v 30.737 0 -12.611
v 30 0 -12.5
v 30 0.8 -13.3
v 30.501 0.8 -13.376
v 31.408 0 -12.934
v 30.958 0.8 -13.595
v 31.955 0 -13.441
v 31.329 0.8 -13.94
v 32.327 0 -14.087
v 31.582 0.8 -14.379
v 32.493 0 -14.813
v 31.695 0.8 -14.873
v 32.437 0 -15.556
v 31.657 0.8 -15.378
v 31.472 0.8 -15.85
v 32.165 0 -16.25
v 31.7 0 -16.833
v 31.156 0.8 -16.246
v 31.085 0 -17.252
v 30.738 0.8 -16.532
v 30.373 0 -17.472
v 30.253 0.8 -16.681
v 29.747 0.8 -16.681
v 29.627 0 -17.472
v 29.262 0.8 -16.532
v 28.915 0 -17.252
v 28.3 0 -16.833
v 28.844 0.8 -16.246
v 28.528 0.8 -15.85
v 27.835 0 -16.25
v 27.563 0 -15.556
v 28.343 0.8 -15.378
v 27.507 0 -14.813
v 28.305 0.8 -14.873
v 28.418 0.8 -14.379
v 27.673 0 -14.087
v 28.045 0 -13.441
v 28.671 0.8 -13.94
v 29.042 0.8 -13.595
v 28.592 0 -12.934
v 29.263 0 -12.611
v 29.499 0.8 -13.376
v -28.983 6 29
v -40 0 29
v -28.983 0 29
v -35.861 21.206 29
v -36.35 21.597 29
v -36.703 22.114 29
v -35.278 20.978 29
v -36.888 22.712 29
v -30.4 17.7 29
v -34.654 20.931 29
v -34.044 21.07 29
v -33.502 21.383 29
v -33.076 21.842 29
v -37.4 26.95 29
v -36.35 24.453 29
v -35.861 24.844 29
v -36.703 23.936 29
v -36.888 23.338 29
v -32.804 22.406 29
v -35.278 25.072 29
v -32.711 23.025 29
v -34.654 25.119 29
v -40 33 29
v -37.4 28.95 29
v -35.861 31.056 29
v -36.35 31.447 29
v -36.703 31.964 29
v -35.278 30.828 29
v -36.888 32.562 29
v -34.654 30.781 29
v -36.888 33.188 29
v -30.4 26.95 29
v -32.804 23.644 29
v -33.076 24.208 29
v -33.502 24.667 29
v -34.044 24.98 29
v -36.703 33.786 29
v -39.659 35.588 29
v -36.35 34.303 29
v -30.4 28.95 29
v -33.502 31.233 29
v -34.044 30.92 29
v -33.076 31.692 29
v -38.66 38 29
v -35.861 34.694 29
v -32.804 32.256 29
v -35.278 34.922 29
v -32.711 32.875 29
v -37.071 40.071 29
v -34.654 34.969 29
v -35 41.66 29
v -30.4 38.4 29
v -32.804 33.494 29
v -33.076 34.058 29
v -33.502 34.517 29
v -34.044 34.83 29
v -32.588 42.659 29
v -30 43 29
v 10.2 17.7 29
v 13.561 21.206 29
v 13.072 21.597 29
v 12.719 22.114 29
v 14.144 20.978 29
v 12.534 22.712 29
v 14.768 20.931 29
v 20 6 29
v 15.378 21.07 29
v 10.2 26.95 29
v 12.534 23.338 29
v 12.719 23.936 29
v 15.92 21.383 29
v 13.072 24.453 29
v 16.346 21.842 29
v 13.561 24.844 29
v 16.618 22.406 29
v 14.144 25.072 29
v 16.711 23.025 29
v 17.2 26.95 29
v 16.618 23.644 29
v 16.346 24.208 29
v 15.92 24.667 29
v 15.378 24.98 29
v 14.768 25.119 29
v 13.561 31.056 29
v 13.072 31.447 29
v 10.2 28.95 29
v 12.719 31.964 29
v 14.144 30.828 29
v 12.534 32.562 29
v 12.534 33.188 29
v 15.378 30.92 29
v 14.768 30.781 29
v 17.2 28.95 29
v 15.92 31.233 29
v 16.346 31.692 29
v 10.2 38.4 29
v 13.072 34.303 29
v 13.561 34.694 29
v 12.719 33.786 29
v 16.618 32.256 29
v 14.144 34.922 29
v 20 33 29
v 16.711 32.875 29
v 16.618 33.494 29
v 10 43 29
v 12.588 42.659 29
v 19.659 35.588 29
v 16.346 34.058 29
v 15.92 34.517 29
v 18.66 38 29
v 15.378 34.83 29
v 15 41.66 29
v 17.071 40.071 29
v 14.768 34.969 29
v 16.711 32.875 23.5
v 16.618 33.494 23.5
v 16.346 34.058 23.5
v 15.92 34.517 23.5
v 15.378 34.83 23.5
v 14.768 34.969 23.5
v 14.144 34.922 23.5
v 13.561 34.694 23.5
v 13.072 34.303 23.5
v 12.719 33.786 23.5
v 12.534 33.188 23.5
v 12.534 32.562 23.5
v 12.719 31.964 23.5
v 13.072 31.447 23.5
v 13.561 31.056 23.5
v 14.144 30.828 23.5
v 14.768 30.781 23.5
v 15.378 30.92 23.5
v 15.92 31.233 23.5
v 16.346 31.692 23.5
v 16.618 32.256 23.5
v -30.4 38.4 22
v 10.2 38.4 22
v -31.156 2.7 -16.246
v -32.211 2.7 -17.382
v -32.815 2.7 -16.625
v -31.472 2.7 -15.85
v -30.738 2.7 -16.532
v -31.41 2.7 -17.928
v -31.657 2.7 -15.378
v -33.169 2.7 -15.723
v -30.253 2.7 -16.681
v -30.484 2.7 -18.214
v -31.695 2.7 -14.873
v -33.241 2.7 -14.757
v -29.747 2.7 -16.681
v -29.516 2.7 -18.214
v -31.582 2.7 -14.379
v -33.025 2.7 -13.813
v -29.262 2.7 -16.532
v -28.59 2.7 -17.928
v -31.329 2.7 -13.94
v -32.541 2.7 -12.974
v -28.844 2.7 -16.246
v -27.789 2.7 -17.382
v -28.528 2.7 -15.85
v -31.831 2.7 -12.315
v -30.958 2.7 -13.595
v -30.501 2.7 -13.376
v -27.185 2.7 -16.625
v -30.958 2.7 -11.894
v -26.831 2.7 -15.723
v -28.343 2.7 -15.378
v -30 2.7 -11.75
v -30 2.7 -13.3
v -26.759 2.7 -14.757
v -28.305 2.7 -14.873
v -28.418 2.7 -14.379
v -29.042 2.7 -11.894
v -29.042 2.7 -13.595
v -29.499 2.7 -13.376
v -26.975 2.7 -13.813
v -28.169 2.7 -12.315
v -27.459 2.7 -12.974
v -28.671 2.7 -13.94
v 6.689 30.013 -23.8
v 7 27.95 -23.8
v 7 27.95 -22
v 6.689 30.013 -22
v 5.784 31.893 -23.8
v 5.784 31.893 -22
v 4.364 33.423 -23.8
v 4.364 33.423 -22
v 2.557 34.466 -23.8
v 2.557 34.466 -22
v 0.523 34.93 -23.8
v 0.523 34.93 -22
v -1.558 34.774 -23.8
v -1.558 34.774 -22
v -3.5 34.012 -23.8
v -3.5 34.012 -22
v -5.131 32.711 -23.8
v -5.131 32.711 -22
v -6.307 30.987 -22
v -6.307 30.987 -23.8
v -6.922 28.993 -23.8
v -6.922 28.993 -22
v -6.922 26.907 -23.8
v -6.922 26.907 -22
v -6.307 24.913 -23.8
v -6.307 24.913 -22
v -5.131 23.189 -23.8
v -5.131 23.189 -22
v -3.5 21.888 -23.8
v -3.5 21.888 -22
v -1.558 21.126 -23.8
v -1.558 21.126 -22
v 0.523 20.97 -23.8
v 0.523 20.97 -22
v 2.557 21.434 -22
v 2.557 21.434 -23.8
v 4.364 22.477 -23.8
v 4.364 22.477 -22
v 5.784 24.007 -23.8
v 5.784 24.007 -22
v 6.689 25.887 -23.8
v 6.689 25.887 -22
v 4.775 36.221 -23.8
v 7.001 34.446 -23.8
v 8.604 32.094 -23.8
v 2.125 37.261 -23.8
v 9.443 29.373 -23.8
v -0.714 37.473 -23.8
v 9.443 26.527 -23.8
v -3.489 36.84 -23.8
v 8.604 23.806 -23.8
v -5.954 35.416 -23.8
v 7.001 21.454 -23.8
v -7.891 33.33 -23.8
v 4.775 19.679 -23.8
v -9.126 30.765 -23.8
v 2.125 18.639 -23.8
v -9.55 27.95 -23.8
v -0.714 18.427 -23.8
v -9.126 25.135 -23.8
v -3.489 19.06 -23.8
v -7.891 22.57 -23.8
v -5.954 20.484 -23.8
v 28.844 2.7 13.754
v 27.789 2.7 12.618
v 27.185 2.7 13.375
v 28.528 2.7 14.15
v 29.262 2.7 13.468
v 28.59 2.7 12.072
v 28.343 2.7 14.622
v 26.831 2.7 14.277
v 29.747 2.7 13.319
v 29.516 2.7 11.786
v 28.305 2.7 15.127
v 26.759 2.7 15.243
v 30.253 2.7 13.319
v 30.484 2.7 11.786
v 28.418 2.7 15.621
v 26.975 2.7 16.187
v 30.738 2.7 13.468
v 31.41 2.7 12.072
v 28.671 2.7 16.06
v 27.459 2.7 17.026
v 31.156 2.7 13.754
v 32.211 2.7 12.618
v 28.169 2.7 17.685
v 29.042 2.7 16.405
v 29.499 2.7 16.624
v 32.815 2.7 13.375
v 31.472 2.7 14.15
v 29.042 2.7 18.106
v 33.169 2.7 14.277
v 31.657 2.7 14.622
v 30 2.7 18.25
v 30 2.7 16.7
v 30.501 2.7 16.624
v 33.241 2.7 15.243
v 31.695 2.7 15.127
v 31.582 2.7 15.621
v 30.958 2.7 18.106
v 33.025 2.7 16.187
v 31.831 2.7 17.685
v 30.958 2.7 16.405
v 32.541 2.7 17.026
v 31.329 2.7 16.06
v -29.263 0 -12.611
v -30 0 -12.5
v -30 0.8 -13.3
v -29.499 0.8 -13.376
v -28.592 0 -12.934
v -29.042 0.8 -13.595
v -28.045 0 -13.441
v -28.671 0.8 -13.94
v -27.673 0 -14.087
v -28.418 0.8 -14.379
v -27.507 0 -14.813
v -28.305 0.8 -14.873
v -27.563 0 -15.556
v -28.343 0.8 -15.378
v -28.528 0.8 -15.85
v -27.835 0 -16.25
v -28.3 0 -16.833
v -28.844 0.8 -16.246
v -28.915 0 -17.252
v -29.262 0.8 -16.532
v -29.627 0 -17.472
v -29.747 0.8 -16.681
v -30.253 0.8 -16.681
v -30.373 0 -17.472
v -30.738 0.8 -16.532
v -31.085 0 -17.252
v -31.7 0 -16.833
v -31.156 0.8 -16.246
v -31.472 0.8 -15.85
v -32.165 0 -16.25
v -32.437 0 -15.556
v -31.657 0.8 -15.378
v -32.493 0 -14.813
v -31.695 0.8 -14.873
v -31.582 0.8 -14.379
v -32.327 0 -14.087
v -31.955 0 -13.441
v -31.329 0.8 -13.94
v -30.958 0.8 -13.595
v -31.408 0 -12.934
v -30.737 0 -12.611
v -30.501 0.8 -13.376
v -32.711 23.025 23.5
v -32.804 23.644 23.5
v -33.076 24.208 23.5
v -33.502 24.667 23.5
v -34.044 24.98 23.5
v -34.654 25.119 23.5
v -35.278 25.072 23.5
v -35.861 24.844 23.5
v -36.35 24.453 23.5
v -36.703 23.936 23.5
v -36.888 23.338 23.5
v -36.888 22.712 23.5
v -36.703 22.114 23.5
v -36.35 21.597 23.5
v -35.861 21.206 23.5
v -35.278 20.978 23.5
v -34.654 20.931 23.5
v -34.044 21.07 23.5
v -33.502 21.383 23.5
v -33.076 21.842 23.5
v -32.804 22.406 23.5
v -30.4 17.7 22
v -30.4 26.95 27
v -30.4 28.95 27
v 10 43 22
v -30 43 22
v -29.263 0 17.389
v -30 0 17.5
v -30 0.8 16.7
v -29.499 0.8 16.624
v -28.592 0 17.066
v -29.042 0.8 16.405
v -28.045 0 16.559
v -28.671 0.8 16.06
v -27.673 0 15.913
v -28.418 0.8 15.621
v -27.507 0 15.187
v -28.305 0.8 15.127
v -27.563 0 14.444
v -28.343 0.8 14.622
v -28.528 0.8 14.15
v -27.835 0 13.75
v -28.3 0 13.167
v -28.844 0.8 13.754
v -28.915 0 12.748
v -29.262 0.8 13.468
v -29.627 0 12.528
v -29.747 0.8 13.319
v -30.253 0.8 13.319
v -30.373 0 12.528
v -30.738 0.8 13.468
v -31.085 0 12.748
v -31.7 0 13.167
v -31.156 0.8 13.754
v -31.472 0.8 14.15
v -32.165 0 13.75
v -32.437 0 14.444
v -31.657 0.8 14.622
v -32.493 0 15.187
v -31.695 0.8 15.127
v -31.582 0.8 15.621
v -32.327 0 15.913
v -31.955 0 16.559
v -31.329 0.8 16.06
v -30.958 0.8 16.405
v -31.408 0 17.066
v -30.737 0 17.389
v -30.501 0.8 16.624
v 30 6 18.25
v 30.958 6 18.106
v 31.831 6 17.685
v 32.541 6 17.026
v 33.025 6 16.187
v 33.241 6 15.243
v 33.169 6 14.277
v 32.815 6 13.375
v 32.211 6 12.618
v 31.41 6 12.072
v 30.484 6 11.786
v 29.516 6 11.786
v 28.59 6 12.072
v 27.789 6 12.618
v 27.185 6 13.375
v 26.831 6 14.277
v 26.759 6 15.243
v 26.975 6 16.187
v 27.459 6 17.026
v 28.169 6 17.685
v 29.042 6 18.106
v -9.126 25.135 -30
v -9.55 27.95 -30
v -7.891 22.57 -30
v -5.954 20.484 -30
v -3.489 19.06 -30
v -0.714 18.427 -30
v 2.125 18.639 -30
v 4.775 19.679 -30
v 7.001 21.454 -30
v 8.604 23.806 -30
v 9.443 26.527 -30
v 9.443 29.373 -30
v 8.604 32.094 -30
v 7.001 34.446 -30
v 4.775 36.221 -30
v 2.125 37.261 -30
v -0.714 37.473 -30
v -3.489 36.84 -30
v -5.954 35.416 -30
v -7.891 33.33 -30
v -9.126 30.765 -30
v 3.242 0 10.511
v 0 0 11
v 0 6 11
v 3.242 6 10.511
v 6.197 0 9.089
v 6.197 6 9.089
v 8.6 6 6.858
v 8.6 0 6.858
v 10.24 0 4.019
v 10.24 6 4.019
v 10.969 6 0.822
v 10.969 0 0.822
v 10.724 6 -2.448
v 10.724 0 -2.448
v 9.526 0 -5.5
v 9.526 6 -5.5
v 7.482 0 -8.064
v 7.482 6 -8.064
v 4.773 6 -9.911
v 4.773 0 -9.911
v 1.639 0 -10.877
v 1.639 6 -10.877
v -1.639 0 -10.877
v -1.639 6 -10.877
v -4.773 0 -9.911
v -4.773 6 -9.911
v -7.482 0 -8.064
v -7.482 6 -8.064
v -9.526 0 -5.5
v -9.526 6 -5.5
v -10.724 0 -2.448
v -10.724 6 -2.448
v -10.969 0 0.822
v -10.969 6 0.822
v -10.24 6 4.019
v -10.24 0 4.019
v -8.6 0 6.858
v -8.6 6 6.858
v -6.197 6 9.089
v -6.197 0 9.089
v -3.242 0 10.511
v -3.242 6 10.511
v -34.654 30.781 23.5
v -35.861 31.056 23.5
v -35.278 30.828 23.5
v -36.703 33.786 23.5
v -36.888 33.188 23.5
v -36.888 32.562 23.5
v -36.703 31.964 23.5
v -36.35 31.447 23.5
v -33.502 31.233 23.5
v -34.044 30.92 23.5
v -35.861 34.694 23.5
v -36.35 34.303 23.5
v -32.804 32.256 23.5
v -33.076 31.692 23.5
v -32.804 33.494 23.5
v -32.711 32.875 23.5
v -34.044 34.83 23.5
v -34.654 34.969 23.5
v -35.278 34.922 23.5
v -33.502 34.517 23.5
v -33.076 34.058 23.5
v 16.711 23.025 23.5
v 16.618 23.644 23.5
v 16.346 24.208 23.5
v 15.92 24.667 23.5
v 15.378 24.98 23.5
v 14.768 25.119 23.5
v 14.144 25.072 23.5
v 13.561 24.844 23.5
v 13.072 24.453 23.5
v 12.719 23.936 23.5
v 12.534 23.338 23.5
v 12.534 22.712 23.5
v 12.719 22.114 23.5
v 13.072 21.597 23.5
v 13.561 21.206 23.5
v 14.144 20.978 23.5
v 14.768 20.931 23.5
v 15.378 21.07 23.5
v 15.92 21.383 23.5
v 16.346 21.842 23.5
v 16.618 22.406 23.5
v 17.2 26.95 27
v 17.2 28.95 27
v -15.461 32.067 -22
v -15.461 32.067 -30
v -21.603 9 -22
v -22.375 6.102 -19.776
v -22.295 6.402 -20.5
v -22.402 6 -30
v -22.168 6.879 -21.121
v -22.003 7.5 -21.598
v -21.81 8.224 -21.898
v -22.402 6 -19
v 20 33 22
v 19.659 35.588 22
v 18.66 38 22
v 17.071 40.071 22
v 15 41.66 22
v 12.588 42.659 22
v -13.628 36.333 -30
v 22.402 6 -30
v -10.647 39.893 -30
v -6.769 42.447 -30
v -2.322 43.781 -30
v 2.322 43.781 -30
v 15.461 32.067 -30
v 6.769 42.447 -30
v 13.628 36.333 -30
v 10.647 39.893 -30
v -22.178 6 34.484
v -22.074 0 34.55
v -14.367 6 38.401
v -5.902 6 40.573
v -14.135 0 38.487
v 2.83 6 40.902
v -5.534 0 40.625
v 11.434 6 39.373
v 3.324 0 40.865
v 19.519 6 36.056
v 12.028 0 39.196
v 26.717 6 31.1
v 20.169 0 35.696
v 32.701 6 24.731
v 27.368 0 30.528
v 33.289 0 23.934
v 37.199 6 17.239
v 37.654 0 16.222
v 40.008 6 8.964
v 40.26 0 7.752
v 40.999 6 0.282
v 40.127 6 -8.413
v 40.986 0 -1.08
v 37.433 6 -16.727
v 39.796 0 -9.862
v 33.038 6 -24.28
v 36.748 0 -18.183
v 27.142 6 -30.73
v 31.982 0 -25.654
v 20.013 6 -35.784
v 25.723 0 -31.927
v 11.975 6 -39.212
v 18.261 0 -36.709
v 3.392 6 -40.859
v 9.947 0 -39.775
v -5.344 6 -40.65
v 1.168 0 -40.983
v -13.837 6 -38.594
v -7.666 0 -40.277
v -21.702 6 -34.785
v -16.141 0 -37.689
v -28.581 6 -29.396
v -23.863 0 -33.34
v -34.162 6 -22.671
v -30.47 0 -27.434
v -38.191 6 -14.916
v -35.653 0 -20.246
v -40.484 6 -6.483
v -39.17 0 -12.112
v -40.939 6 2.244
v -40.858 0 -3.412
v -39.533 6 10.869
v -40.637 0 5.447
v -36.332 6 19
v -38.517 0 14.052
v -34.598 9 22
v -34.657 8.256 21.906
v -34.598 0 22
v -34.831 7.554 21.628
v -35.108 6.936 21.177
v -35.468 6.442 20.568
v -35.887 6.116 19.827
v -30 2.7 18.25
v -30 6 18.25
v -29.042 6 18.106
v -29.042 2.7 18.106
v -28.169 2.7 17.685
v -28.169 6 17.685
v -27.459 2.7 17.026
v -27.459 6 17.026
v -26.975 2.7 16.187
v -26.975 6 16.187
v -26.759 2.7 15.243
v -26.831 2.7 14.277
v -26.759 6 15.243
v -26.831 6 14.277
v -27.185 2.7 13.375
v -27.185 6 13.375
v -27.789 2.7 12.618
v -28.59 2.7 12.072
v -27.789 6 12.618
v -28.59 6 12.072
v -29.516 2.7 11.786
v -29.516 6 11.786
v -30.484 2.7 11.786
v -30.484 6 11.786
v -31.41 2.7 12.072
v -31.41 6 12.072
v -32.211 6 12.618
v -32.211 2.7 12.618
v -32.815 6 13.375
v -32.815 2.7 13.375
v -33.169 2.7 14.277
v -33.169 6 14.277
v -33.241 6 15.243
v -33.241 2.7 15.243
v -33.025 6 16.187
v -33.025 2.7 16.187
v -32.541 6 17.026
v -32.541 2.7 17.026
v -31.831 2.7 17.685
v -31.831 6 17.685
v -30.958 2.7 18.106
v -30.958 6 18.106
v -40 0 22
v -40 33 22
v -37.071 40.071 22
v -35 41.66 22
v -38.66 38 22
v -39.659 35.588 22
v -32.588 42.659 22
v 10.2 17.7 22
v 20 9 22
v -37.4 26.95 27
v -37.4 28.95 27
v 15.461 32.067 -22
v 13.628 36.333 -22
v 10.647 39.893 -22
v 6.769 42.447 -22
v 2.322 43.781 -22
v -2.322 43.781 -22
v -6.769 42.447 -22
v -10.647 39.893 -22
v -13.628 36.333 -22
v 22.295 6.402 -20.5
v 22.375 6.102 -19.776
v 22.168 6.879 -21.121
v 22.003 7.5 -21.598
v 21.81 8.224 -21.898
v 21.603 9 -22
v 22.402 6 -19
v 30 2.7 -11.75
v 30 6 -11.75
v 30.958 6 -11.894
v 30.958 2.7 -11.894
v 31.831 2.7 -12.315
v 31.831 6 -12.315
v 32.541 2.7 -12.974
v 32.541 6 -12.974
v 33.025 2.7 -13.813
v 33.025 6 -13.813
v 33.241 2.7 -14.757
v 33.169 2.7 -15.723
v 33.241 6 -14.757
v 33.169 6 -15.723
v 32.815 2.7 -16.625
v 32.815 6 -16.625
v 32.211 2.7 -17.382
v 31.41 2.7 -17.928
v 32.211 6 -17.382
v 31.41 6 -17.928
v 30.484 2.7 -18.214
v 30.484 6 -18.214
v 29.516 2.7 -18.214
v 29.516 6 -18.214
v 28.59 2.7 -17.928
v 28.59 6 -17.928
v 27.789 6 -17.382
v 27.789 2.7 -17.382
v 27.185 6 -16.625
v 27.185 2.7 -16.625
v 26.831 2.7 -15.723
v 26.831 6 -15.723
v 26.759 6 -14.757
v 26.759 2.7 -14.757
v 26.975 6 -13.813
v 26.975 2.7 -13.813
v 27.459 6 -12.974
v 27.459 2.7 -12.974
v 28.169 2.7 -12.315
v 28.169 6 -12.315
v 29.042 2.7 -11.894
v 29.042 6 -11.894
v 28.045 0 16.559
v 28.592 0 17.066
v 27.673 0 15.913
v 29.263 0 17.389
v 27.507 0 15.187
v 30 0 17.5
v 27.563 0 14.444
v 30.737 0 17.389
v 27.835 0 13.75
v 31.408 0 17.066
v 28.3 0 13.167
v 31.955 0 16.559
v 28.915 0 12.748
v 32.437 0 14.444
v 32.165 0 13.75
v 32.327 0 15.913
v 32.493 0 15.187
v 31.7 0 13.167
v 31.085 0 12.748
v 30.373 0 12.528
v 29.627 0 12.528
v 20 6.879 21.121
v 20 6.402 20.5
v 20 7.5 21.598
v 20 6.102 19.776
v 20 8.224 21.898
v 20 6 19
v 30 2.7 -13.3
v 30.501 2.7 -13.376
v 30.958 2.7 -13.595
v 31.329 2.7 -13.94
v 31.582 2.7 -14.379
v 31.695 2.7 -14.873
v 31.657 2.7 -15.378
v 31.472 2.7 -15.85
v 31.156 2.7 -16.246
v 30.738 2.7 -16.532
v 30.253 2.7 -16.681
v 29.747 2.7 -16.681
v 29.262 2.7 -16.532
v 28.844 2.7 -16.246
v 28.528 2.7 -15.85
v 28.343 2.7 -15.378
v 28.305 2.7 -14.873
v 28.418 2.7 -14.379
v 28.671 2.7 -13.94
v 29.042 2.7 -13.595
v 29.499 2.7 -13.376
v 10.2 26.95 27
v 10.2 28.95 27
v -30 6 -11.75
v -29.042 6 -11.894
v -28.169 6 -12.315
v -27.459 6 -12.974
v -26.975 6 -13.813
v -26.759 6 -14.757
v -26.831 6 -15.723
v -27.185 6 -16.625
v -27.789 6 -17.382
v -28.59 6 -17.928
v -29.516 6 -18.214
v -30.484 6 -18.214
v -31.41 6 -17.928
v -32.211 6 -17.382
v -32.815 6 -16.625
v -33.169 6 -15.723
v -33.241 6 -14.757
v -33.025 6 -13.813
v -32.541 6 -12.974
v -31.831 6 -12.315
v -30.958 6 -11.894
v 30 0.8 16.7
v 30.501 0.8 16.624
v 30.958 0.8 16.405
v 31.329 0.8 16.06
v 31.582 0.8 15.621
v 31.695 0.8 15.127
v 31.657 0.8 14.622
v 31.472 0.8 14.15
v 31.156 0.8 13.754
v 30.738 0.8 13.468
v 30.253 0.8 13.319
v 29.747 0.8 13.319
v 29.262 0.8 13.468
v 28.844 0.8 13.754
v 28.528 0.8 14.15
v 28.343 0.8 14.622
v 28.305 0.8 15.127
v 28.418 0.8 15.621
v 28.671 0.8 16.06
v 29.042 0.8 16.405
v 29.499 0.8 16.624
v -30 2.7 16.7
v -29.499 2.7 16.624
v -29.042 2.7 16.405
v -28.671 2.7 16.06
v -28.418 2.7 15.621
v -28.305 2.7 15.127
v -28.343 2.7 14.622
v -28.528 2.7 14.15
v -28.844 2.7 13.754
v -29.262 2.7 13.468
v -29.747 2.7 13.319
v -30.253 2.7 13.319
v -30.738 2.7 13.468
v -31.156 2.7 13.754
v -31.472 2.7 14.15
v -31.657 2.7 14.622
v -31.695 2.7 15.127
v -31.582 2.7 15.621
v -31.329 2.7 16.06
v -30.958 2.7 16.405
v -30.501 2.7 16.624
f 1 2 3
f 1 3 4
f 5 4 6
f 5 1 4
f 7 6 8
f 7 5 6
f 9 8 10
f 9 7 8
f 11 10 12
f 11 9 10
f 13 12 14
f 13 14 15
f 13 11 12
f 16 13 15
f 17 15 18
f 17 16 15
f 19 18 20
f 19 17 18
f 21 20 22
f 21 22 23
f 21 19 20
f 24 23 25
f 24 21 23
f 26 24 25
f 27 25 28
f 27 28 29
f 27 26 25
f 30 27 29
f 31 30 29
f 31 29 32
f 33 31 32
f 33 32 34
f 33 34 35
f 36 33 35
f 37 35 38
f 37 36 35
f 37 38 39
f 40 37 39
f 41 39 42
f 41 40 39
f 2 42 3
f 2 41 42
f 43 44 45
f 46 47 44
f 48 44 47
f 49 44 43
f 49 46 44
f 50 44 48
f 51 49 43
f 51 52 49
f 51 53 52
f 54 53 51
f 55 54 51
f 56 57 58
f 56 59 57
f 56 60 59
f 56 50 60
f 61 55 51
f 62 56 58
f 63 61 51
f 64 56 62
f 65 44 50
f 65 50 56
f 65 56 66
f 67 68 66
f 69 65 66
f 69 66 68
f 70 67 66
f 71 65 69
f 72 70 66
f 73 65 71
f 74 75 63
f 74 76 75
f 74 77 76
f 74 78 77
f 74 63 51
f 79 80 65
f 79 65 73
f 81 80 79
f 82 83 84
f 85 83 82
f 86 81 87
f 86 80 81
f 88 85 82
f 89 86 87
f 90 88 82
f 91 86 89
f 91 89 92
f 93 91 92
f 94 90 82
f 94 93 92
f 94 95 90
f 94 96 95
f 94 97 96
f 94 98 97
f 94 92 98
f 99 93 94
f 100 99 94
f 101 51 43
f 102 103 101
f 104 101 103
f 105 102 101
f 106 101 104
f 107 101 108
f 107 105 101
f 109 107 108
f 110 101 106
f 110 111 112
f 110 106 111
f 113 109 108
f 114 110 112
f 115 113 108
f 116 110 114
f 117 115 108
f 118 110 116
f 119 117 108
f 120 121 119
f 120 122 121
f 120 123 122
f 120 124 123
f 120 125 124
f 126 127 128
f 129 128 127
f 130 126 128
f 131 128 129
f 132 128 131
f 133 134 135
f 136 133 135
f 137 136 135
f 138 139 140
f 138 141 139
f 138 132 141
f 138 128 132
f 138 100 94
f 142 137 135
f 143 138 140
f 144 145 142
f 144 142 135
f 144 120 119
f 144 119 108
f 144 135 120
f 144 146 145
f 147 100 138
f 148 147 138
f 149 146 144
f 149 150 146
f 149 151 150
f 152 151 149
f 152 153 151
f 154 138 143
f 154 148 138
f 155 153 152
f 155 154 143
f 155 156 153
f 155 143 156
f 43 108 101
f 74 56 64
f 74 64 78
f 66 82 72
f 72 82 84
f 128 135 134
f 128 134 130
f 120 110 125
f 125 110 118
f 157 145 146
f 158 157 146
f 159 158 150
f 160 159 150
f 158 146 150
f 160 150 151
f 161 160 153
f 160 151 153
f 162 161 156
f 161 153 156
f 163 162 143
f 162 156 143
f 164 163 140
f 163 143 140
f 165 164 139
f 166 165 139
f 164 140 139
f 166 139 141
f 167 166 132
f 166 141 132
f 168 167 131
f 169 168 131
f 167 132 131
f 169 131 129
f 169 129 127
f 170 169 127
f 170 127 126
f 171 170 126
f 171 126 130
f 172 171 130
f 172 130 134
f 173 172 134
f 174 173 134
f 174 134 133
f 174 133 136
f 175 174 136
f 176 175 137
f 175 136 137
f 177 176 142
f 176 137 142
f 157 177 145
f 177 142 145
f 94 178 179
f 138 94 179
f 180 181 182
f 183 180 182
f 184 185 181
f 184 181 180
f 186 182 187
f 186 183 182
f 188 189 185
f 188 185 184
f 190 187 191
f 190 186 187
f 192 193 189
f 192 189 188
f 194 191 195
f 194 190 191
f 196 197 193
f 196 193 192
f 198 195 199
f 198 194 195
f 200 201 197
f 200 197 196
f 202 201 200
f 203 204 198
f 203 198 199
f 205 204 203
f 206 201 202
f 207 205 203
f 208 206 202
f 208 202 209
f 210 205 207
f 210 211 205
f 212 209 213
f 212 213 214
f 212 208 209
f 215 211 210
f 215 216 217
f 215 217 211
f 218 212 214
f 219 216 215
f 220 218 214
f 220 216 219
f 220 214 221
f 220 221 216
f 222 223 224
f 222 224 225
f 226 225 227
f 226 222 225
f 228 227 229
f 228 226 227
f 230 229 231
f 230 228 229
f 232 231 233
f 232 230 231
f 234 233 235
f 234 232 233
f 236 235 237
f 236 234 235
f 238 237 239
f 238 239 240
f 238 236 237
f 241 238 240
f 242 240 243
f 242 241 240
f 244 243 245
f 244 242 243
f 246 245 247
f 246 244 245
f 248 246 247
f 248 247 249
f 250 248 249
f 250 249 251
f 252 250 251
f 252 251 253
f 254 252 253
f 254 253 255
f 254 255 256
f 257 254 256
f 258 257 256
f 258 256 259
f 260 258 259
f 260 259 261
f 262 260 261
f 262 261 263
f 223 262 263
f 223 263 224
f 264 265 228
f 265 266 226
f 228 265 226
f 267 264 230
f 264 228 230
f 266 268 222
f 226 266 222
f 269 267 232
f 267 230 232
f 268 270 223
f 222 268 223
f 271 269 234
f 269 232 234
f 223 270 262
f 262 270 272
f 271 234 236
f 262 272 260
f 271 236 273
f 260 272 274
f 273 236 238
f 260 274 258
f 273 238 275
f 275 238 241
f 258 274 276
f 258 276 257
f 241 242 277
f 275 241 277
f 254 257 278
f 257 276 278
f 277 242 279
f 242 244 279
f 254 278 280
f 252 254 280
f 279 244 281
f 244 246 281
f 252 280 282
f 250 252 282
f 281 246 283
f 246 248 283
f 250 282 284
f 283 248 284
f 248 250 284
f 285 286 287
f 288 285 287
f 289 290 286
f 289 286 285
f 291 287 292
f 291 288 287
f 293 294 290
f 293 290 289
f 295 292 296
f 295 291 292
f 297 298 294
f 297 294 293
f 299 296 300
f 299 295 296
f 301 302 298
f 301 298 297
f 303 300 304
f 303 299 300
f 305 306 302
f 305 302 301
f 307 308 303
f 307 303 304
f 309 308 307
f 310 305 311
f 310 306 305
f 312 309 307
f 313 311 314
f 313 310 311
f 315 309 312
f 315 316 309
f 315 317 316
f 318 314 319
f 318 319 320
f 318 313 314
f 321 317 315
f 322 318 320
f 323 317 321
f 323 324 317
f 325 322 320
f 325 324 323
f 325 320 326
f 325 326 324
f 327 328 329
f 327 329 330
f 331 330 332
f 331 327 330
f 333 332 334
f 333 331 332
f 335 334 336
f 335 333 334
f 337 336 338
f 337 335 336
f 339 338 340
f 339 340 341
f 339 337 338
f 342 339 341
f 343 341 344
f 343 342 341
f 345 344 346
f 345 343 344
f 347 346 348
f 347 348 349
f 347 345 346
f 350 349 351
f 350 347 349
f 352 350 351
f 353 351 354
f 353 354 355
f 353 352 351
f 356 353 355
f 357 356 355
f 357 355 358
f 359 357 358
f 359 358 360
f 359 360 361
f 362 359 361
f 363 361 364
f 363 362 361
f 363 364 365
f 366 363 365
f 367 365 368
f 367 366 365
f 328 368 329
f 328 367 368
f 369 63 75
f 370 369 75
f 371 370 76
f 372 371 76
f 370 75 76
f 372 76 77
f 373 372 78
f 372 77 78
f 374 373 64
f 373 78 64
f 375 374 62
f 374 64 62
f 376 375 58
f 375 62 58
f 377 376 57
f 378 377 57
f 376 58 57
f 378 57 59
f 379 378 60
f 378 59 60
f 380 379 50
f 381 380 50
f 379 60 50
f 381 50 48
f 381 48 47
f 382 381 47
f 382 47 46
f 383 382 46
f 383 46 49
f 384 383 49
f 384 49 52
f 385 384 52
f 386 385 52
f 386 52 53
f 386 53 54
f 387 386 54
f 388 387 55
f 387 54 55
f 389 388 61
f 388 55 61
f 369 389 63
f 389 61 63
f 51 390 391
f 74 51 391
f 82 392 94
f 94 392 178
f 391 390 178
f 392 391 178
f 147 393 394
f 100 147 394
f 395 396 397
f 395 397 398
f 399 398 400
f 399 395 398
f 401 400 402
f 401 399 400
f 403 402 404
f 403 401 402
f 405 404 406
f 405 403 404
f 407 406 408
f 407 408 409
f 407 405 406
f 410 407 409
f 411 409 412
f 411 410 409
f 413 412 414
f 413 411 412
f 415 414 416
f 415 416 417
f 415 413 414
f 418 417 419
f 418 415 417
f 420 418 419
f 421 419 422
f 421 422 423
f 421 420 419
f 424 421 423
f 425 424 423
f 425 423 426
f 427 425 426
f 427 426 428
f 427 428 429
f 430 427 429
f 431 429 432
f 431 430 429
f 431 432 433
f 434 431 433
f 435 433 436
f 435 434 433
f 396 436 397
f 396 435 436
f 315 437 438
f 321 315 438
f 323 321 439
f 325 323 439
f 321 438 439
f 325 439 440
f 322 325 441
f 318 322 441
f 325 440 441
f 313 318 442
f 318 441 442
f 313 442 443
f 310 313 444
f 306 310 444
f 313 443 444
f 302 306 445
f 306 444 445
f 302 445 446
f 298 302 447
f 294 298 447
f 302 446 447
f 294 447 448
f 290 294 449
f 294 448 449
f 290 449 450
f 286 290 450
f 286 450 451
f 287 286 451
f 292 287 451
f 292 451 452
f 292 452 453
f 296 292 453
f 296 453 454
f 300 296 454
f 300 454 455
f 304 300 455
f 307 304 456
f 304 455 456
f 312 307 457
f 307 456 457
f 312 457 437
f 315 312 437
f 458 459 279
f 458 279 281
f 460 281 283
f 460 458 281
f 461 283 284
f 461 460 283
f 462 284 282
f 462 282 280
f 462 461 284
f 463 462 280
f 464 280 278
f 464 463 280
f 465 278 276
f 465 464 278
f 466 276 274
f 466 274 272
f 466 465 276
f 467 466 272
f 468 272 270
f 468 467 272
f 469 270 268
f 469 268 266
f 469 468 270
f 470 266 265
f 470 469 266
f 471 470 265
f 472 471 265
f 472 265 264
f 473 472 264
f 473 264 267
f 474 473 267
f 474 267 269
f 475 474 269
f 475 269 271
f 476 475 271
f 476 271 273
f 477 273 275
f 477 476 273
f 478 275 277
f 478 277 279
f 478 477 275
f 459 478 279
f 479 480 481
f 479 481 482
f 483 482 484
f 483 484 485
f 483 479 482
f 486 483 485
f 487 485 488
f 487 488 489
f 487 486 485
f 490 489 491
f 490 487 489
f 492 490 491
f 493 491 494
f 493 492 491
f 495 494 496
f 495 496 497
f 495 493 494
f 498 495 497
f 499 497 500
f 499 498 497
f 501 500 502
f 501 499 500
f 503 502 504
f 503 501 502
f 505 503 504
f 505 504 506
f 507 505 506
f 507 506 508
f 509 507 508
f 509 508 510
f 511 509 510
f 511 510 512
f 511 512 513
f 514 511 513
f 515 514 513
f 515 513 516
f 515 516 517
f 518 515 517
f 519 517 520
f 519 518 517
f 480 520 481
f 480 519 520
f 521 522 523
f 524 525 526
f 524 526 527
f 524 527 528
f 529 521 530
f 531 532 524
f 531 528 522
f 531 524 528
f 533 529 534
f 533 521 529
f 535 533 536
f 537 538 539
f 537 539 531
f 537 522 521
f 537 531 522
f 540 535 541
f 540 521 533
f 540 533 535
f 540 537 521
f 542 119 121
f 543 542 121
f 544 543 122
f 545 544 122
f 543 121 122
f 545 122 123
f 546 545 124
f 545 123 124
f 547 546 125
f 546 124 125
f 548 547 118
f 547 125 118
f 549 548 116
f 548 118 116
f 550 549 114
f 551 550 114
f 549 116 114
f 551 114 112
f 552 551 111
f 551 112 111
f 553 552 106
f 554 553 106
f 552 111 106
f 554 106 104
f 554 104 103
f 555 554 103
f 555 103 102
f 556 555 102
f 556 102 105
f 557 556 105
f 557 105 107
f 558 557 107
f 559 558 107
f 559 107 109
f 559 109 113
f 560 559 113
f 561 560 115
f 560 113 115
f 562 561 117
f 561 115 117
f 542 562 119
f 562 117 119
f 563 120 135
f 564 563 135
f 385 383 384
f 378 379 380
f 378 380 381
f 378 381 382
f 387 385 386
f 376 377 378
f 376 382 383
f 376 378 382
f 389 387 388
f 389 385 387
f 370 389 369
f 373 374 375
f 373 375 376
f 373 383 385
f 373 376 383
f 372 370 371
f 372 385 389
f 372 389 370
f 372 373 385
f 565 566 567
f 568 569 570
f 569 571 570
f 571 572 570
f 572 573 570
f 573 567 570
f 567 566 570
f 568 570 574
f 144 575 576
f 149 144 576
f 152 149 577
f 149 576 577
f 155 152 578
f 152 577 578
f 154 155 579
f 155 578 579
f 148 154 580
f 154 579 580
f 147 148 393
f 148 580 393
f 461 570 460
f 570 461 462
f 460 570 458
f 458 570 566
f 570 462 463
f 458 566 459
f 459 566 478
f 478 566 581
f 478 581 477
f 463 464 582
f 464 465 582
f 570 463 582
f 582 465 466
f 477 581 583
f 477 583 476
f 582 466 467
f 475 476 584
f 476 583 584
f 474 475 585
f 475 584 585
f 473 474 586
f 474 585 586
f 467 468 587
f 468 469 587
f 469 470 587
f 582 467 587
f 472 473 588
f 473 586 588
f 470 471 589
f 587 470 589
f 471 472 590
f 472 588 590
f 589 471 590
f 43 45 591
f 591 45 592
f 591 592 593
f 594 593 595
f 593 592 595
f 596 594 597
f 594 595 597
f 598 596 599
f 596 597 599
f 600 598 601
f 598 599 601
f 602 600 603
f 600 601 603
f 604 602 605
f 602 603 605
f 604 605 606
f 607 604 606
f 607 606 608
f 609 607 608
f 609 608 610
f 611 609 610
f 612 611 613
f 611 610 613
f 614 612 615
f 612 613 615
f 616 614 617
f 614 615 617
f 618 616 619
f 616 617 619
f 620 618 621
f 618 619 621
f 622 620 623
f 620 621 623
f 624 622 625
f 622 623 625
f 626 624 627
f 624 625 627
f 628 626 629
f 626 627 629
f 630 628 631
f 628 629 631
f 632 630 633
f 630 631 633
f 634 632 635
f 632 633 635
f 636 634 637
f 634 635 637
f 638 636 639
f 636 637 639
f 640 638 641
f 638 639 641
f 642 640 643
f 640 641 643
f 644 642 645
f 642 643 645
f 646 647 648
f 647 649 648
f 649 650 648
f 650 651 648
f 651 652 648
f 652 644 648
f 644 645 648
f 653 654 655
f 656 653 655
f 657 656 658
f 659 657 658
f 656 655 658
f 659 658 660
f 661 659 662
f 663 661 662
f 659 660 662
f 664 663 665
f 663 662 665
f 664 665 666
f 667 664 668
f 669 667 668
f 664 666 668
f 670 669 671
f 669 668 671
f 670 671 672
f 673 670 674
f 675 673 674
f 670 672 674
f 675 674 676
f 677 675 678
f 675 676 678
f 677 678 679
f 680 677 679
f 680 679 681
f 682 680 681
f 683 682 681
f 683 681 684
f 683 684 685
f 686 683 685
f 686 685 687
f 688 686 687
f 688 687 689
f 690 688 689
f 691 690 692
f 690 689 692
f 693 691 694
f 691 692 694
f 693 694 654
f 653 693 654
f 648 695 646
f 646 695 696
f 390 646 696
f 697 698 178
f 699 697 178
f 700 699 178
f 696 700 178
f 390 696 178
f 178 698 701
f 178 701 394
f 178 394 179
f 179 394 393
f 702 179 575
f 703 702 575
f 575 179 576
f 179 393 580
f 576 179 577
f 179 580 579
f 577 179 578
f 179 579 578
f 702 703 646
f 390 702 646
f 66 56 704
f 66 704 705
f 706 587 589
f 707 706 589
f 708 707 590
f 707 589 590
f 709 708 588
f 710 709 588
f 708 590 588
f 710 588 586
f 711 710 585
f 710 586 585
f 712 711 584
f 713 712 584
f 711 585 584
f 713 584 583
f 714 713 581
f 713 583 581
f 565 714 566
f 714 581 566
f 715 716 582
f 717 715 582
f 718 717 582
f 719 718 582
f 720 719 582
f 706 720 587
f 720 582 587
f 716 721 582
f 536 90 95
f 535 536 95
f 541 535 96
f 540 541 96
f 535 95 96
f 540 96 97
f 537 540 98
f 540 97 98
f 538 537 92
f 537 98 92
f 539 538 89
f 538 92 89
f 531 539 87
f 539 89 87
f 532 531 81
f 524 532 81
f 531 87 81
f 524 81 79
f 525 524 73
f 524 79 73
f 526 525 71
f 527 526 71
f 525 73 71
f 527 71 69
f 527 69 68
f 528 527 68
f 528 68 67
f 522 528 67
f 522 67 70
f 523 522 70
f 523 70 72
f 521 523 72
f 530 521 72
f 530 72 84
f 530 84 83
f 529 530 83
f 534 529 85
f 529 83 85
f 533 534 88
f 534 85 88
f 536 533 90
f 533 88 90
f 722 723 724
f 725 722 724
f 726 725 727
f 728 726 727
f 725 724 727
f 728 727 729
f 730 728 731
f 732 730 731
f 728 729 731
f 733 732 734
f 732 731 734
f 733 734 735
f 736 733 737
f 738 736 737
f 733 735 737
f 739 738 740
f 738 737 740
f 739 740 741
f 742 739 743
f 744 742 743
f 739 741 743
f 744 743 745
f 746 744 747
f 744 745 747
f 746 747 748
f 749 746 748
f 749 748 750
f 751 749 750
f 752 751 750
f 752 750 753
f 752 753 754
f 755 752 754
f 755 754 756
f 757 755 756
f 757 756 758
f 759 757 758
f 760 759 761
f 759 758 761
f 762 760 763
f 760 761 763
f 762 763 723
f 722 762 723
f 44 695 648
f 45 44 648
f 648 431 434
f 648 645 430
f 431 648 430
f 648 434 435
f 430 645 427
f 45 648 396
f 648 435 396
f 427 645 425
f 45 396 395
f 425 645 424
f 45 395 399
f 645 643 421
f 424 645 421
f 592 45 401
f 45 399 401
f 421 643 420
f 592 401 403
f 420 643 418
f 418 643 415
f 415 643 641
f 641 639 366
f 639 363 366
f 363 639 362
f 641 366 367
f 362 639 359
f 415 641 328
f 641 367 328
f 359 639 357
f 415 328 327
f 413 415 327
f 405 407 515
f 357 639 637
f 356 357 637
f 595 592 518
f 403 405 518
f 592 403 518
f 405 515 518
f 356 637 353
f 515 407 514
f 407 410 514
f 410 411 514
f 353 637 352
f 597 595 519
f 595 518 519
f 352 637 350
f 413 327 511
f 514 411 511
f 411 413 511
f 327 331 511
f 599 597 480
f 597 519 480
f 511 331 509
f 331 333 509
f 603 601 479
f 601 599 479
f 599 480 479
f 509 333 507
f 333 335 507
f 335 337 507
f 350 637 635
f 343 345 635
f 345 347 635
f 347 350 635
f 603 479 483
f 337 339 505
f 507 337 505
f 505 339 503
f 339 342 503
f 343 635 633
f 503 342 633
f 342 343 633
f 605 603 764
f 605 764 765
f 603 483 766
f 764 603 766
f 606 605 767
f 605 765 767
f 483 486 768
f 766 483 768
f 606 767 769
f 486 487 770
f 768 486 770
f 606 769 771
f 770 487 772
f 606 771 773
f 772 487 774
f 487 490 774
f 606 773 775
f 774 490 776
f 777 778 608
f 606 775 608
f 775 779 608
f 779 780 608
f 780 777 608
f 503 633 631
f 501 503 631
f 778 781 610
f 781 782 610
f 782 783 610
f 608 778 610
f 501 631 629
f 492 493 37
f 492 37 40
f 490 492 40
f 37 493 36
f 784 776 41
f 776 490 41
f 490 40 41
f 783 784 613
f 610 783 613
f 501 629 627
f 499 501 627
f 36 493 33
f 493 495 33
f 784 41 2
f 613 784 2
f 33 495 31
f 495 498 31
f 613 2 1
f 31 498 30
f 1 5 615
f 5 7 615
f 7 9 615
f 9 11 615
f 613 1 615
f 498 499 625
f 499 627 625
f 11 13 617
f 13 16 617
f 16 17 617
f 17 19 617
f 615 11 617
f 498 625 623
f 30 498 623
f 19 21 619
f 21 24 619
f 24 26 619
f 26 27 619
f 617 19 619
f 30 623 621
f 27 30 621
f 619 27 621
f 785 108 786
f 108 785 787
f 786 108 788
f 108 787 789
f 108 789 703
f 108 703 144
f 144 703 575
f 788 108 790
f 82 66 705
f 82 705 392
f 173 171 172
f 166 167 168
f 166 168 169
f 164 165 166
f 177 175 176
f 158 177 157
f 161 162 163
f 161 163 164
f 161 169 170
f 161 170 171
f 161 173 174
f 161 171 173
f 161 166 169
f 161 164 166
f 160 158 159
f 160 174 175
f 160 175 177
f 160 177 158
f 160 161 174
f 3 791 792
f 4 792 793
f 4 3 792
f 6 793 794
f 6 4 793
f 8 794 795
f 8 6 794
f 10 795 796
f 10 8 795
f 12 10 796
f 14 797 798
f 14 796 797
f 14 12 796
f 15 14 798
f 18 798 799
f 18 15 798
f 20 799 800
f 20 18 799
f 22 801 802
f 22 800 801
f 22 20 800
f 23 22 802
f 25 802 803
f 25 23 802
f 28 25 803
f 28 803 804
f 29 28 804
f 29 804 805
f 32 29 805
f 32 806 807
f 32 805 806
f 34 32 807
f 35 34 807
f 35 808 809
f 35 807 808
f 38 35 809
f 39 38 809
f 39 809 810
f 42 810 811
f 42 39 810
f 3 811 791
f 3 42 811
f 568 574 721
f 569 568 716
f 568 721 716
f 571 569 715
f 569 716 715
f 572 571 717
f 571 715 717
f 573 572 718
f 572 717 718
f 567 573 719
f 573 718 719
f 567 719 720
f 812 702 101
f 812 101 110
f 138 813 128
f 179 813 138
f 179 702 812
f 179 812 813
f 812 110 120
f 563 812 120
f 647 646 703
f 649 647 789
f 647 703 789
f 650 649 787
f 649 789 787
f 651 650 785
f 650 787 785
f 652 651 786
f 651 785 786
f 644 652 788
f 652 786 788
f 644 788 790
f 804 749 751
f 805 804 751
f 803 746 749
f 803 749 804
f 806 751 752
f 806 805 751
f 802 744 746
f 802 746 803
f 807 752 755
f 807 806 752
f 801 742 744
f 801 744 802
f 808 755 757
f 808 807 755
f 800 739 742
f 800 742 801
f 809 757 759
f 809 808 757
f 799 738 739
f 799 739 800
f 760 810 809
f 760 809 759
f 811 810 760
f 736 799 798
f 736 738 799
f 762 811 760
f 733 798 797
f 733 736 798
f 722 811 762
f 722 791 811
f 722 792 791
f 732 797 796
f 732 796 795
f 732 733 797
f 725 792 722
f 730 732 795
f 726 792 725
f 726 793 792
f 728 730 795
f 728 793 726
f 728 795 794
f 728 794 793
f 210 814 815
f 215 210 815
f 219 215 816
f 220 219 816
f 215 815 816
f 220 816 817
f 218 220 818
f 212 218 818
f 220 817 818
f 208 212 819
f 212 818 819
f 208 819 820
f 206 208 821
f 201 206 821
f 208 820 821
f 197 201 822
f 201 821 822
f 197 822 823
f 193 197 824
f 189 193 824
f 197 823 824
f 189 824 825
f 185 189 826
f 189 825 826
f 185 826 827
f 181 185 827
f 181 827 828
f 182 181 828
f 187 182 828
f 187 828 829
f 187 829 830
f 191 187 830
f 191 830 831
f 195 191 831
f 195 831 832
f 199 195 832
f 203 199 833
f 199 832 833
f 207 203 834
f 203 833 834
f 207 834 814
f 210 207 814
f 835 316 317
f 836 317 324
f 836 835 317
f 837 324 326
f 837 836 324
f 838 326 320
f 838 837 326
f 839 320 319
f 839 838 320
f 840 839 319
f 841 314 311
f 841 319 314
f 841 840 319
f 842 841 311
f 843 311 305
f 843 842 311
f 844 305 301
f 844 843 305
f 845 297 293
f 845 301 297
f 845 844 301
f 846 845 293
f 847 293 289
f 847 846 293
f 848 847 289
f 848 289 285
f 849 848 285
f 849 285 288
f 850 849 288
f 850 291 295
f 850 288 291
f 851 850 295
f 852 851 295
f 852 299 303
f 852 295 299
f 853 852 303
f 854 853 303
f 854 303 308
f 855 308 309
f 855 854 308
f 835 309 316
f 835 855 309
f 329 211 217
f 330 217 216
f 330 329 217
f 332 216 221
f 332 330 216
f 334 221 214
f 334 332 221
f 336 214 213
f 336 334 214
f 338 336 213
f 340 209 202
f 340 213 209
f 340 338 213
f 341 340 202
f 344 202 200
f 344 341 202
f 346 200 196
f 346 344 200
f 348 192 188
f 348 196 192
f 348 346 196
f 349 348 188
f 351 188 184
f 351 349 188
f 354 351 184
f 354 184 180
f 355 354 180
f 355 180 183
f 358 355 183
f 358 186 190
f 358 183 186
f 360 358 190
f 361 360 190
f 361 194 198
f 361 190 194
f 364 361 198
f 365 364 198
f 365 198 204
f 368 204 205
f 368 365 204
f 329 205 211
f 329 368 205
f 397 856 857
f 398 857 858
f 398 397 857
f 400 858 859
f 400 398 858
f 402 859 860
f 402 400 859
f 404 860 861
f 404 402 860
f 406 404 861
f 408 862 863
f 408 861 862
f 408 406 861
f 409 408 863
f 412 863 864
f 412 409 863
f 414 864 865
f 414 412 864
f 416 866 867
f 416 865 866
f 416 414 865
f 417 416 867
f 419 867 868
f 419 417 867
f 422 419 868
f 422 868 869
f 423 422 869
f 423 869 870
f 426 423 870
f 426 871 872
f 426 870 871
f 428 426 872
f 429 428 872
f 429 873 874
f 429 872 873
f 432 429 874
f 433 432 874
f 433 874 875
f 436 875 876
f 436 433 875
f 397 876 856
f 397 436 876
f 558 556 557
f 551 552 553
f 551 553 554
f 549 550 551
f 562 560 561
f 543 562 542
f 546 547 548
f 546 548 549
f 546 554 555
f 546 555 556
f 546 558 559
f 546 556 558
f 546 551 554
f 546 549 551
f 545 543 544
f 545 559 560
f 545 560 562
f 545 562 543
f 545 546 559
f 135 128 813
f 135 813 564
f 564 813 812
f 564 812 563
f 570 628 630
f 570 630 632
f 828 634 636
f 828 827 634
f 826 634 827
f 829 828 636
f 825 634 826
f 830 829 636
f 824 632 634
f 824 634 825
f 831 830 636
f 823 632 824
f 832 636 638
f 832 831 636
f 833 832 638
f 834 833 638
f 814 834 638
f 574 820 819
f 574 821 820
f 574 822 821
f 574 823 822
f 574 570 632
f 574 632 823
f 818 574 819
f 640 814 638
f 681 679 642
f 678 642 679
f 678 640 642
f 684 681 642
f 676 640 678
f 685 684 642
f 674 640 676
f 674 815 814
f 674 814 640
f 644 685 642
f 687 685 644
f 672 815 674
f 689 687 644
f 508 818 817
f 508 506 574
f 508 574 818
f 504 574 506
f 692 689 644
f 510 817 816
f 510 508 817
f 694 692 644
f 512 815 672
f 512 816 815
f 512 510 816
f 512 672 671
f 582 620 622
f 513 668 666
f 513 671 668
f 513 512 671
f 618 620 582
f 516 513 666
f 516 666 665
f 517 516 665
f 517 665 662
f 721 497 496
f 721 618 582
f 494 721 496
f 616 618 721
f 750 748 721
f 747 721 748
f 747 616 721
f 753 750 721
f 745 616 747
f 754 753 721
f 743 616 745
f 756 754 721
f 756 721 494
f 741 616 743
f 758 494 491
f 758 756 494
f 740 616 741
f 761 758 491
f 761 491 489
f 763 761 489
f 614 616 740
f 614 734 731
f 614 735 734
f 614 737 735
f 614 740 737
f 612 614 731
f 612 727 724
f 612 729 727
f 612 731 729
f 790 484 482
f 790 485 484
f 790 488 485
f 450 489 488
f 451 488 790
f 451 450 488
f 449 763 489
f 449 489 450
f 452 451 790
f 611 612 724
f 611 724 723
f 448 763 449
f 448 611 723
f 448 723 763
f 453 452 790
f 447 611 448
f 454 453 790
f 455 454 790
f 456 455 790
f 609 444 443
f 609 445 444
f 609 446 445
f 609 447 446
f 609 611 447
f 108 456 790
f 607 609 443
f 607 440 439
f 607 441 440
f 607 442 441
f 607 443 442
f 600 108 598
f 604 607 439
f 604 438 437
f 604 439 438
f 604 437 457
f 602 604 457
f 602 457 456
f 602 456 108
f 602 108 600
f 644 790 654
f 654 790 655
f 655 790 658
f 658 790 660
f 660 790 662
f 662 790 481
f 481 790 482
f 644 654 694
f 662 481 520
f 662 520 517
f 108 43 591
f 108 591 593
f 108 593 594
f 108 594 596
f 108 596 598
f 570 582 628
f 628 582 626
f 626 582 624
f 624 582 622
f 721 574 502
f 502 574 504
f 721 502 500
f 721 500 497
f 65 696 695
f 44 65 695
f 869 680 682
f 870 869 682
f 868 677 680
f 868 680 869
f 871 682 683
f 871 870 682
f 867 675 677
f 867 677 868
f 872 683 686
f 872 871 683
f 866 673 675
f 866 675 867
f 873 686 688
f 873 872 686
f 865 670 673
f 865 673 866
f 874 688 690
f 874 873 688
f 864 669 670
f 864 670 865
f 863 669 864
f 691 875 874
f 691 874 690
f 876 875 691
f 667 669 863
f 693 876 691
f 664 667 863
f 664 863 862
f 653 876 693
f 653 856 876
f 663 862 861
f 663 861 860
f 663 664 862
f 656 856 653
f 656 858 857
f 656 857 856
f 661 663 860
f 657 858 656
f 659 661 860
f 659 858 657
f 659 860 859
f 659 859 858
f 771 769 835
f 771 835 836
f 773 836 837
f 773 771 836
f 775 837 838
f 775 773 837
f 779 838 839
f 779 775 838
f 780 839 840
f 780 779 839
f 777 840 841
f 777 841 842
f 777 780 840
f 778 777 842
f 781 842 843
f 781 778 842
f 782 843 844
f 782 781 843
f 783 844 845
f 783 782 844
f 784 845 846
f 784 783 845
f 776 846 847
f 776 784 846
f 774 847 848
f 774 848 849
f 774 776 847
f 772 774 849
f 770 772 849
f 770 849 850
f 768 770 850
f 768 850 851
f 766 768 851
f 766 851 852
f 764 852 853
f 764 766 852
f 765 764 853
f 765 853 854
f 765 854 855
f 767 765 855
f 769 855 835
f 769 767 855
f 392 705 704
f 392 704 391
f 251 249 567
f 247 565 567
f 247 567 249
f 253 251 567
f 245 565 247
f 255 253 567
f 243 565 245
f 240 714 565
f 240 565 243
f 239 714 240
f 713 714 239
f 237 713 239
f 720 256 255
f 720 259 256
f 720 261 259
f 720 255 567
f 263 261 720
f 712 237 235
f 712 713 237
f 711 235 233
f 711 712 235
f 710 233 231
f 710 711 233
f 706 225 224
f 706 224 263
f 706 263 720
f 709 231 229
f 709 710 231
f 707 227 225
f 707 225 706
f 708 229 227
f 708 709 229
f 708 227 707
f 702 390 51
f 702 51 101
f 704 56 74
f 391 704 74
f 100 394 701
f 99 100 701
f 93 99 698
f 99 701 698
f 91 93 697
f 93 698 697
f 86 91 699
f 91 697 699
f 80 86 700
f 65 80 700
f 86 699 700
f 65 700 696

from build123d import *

# Parameters (mm, degrees)
SKETCH1_R           = 41
BOSS_EXTRUDE1_DEPTH = 6
BOSS_EXTRUDE2_DEPTH = 8
BOSS_EXTRUDE3_DEPTH = 7
SKETCH4_W           = 40.6
SKETCH4_H           = 20.7
CUT_EXTRUDE1_DEPTH  = 7
SKETCH5_R           = 9.55
CUT_EXTRUDE2_DEPTH  = 6.2
SKETCH6_R           = 7
CUT_EXTRUDE3_DEPTH  = 8
SKETCH7_R           = 11
SKETCH7_R_2         = 1.7
CUT_EXTRUDE4_DEPTH  = 6
SKETCH8_R           = 3.25
CUT_EXTRUDE6_DEPTH  = 3.3
SKETCH10_R          = 2.1
CUT_EXTRUDE8_DEPTH  = 5.5
FILLET1_R           = 3
CHAMFER1_SIZE       = 0.8
SKETCH11_W          = 7.2
SKETCH11_H          = 2
CUT_EXTRUDE9_DEPTH  = 2


with BuildPart() as part:
    # Sketch1 → Boss-Extrude1 (new body)
    with BuildSketch(Plane(origin=(0, 0, 0), x_dir=(1, 0, 0), z_dir=(0, 1, 0))):
        with Locations(Location((0, 0, 0), (0, 0, 270))):
            Circle(SKETCH1_R)
    extrude(amount=BOSS_EXTRUDE1_DEPTH)

    # Sketch2 → Boss-Extrude2 (add)
    with BuildSketch(Plane.XY.offset(-30)):
        with BuildLine():
            Line((-24, 0), (24, 0))
            Line((24, 0), (15.461253, 32.066997))
            ThreePointArc((15.461253, 32.066997), (0, 43.95000027), (-15.461253, 32.066997))
            Line((-15.461253, 32.066997), (-24, 0))
        make_face()
    extrude(amount=BOSS_EXTRUDE2_DEPTH)

    # Sketch3 → Boss-Extrude3 (add)
    with BuildSketch(Plane.XY.offset(22)):
        with BuildLine():
            Line((-40, 0), (20, 0))
            Line((20, 0), (20, 33))
            ThreePointArc((20, 33), (17.071067812, 40.071067812), (10, 43))
            Line((10, 43), (-30, 43))
            ThreePointArc((-30, 43), (-37.071067812, 40.071067812), (-40, 33))
            Line((-40, 33), (-40, 0))
        make_face()
    extrude(amount=BOSS_EXTRUDE3_DEPTH)

    # Sketch4 → Cut-Extrude1 (cut)
    with BuildSketch(Plane.XY.offset(22)):
        with Locations((-10.1, 28.05)):
            Rectangle(SKETCH4_W, SKETCH4_H)
    extrude(amount=CUT_EXTRUDE1_DEPTH, mode=Mode.SUBTRACT)

    # Sketch5 → Cut-Extrude2 (cut)
    with BuildSketch(Plane.XY.offset(-30)):
        with Locations(Location((0, 27.95, 0), (0, 0, 180))):
            Circle(SKETCH5_R)
    extrude(amount=CUT_EXTRUDE2_DEPTH, mode=Mode.SUBTRACT)

    # Sketch6 → Cut-Extrude3 (cut)
    with BuildSketch(Plane.XY.offset(-30)):
        with Locations((0, 27.95)):
            Circle(SKETCH6_R)
    extrude(amount=CUT_EXTRUDE3_DEPTH, mode=Mode.SUBTRACT)

    # Sketch7 → Cut-Extrude4 (cut)
    with BuildSketch(Plane(origin=(0, 0, 0), x_dir=(1, 0, 0), z_dir=(0, 1, 0))):
        with Locations(Location((0, 0, 0), (0, 0, 270))):
            Circle(SKETCH7_R)
        with Locations(Location((30, 15, 0), (0, 0, 270))):
            Circle(SKETCH7_R_2)
        with Locations(Location((30, -15, 0), (0, 0, 270))):
            Circle(SKETCH7_R_2)
        with Locations(Location((-30, 15, 0), (0, 0, 270))):
            Circle(SKETCH7_R_2)
        with Locations(Location((-30, -15, 0), (0, 0, 270))):
            Circle(SKETCH7_R_2)
    extrude(amount=CUT_EXTRUDE4_DEPTH, mode=Mode.SUBTRACT)

    # Sketch8 → Cut-Extrude6 (cut)
    with BuildSketch(Plane(origin=(0, 6, 0), x_dir=(1, 0, 0), z_dir=(0, 1, 0))):
        with Locations(Location((30, 15, 0), (0, 0, 270))):
            Circle(SKETCH8_R)
        with Locations(Location((30, -15, 0), (0, 0, 270))):
            Circle(SKETCH8_R)
        with Locations(Location((-30, 15, 0), (0, 0, 270))):
            Circle(SKETCH8_R)
        with Locations(Location((-30, -15, 0), (0, 0, 270))):
            Circle(SKETCH8_R)
    extrude(amount=-CUT_EXTRUDE6_DEPTH, mode=Mode.SUBTRACT)

    # Sketch10 → Cut-Extrude8 (cut)
    with BuildSketch(Plane.XY.offset(29)):
        with Locations((-34.811, 23.025)):
            Circle(SKETCH10_R)
        with Locations((-34.811, 32.875)):
            Circle(SKETCH10_R)
        with Locations((14.611, 23.025)):
            Circle(SKETCH10_R)
        with Locations((14.611, 32.875)):
            Circle(SKETCH10_R)
    extrude(amount=-CUT_EXTRUDE8_DEPTH, mode=Mode.SUBTRACT)

    # Fillet1
    fillet1_edges = [part.edges().sort_by_distance(p)[0] for p in [
        (0, 6, -22),
        (-7.298843892, 6, 22),
    ]]
    fillet(fillet1_edges, radius=FILLET1_R)

    # Chamfer1
    chamfer1_edges = [part.edges().sort_by_distance(p)[0] for p in [
        (-30, 0, 13.3),
        (-30, 0, -16.7),
        (30, 0, 13.3),
        (30, 0, -16.7),
    ]]
    chamfer(chamfer1_edges, length=CHAMFER1_SIZE)

    # Sketch11 → Cut-Extrude9 (cut)
    with BuildSketch(Plane.XY.offset(29)):
        with Locations((-33.8, 27.95)):
            Rectangle(SKETCH11_W, SKETCH11_H)
        with Locations((13.6, 27.95)):
            Rectangle(SKETCH11_W, SKETCH11_H)
    extrude(amount=-CUT_EXTRUDE9_DEPTH, mode=Mode.SUBTRACT)


solid = part.part
